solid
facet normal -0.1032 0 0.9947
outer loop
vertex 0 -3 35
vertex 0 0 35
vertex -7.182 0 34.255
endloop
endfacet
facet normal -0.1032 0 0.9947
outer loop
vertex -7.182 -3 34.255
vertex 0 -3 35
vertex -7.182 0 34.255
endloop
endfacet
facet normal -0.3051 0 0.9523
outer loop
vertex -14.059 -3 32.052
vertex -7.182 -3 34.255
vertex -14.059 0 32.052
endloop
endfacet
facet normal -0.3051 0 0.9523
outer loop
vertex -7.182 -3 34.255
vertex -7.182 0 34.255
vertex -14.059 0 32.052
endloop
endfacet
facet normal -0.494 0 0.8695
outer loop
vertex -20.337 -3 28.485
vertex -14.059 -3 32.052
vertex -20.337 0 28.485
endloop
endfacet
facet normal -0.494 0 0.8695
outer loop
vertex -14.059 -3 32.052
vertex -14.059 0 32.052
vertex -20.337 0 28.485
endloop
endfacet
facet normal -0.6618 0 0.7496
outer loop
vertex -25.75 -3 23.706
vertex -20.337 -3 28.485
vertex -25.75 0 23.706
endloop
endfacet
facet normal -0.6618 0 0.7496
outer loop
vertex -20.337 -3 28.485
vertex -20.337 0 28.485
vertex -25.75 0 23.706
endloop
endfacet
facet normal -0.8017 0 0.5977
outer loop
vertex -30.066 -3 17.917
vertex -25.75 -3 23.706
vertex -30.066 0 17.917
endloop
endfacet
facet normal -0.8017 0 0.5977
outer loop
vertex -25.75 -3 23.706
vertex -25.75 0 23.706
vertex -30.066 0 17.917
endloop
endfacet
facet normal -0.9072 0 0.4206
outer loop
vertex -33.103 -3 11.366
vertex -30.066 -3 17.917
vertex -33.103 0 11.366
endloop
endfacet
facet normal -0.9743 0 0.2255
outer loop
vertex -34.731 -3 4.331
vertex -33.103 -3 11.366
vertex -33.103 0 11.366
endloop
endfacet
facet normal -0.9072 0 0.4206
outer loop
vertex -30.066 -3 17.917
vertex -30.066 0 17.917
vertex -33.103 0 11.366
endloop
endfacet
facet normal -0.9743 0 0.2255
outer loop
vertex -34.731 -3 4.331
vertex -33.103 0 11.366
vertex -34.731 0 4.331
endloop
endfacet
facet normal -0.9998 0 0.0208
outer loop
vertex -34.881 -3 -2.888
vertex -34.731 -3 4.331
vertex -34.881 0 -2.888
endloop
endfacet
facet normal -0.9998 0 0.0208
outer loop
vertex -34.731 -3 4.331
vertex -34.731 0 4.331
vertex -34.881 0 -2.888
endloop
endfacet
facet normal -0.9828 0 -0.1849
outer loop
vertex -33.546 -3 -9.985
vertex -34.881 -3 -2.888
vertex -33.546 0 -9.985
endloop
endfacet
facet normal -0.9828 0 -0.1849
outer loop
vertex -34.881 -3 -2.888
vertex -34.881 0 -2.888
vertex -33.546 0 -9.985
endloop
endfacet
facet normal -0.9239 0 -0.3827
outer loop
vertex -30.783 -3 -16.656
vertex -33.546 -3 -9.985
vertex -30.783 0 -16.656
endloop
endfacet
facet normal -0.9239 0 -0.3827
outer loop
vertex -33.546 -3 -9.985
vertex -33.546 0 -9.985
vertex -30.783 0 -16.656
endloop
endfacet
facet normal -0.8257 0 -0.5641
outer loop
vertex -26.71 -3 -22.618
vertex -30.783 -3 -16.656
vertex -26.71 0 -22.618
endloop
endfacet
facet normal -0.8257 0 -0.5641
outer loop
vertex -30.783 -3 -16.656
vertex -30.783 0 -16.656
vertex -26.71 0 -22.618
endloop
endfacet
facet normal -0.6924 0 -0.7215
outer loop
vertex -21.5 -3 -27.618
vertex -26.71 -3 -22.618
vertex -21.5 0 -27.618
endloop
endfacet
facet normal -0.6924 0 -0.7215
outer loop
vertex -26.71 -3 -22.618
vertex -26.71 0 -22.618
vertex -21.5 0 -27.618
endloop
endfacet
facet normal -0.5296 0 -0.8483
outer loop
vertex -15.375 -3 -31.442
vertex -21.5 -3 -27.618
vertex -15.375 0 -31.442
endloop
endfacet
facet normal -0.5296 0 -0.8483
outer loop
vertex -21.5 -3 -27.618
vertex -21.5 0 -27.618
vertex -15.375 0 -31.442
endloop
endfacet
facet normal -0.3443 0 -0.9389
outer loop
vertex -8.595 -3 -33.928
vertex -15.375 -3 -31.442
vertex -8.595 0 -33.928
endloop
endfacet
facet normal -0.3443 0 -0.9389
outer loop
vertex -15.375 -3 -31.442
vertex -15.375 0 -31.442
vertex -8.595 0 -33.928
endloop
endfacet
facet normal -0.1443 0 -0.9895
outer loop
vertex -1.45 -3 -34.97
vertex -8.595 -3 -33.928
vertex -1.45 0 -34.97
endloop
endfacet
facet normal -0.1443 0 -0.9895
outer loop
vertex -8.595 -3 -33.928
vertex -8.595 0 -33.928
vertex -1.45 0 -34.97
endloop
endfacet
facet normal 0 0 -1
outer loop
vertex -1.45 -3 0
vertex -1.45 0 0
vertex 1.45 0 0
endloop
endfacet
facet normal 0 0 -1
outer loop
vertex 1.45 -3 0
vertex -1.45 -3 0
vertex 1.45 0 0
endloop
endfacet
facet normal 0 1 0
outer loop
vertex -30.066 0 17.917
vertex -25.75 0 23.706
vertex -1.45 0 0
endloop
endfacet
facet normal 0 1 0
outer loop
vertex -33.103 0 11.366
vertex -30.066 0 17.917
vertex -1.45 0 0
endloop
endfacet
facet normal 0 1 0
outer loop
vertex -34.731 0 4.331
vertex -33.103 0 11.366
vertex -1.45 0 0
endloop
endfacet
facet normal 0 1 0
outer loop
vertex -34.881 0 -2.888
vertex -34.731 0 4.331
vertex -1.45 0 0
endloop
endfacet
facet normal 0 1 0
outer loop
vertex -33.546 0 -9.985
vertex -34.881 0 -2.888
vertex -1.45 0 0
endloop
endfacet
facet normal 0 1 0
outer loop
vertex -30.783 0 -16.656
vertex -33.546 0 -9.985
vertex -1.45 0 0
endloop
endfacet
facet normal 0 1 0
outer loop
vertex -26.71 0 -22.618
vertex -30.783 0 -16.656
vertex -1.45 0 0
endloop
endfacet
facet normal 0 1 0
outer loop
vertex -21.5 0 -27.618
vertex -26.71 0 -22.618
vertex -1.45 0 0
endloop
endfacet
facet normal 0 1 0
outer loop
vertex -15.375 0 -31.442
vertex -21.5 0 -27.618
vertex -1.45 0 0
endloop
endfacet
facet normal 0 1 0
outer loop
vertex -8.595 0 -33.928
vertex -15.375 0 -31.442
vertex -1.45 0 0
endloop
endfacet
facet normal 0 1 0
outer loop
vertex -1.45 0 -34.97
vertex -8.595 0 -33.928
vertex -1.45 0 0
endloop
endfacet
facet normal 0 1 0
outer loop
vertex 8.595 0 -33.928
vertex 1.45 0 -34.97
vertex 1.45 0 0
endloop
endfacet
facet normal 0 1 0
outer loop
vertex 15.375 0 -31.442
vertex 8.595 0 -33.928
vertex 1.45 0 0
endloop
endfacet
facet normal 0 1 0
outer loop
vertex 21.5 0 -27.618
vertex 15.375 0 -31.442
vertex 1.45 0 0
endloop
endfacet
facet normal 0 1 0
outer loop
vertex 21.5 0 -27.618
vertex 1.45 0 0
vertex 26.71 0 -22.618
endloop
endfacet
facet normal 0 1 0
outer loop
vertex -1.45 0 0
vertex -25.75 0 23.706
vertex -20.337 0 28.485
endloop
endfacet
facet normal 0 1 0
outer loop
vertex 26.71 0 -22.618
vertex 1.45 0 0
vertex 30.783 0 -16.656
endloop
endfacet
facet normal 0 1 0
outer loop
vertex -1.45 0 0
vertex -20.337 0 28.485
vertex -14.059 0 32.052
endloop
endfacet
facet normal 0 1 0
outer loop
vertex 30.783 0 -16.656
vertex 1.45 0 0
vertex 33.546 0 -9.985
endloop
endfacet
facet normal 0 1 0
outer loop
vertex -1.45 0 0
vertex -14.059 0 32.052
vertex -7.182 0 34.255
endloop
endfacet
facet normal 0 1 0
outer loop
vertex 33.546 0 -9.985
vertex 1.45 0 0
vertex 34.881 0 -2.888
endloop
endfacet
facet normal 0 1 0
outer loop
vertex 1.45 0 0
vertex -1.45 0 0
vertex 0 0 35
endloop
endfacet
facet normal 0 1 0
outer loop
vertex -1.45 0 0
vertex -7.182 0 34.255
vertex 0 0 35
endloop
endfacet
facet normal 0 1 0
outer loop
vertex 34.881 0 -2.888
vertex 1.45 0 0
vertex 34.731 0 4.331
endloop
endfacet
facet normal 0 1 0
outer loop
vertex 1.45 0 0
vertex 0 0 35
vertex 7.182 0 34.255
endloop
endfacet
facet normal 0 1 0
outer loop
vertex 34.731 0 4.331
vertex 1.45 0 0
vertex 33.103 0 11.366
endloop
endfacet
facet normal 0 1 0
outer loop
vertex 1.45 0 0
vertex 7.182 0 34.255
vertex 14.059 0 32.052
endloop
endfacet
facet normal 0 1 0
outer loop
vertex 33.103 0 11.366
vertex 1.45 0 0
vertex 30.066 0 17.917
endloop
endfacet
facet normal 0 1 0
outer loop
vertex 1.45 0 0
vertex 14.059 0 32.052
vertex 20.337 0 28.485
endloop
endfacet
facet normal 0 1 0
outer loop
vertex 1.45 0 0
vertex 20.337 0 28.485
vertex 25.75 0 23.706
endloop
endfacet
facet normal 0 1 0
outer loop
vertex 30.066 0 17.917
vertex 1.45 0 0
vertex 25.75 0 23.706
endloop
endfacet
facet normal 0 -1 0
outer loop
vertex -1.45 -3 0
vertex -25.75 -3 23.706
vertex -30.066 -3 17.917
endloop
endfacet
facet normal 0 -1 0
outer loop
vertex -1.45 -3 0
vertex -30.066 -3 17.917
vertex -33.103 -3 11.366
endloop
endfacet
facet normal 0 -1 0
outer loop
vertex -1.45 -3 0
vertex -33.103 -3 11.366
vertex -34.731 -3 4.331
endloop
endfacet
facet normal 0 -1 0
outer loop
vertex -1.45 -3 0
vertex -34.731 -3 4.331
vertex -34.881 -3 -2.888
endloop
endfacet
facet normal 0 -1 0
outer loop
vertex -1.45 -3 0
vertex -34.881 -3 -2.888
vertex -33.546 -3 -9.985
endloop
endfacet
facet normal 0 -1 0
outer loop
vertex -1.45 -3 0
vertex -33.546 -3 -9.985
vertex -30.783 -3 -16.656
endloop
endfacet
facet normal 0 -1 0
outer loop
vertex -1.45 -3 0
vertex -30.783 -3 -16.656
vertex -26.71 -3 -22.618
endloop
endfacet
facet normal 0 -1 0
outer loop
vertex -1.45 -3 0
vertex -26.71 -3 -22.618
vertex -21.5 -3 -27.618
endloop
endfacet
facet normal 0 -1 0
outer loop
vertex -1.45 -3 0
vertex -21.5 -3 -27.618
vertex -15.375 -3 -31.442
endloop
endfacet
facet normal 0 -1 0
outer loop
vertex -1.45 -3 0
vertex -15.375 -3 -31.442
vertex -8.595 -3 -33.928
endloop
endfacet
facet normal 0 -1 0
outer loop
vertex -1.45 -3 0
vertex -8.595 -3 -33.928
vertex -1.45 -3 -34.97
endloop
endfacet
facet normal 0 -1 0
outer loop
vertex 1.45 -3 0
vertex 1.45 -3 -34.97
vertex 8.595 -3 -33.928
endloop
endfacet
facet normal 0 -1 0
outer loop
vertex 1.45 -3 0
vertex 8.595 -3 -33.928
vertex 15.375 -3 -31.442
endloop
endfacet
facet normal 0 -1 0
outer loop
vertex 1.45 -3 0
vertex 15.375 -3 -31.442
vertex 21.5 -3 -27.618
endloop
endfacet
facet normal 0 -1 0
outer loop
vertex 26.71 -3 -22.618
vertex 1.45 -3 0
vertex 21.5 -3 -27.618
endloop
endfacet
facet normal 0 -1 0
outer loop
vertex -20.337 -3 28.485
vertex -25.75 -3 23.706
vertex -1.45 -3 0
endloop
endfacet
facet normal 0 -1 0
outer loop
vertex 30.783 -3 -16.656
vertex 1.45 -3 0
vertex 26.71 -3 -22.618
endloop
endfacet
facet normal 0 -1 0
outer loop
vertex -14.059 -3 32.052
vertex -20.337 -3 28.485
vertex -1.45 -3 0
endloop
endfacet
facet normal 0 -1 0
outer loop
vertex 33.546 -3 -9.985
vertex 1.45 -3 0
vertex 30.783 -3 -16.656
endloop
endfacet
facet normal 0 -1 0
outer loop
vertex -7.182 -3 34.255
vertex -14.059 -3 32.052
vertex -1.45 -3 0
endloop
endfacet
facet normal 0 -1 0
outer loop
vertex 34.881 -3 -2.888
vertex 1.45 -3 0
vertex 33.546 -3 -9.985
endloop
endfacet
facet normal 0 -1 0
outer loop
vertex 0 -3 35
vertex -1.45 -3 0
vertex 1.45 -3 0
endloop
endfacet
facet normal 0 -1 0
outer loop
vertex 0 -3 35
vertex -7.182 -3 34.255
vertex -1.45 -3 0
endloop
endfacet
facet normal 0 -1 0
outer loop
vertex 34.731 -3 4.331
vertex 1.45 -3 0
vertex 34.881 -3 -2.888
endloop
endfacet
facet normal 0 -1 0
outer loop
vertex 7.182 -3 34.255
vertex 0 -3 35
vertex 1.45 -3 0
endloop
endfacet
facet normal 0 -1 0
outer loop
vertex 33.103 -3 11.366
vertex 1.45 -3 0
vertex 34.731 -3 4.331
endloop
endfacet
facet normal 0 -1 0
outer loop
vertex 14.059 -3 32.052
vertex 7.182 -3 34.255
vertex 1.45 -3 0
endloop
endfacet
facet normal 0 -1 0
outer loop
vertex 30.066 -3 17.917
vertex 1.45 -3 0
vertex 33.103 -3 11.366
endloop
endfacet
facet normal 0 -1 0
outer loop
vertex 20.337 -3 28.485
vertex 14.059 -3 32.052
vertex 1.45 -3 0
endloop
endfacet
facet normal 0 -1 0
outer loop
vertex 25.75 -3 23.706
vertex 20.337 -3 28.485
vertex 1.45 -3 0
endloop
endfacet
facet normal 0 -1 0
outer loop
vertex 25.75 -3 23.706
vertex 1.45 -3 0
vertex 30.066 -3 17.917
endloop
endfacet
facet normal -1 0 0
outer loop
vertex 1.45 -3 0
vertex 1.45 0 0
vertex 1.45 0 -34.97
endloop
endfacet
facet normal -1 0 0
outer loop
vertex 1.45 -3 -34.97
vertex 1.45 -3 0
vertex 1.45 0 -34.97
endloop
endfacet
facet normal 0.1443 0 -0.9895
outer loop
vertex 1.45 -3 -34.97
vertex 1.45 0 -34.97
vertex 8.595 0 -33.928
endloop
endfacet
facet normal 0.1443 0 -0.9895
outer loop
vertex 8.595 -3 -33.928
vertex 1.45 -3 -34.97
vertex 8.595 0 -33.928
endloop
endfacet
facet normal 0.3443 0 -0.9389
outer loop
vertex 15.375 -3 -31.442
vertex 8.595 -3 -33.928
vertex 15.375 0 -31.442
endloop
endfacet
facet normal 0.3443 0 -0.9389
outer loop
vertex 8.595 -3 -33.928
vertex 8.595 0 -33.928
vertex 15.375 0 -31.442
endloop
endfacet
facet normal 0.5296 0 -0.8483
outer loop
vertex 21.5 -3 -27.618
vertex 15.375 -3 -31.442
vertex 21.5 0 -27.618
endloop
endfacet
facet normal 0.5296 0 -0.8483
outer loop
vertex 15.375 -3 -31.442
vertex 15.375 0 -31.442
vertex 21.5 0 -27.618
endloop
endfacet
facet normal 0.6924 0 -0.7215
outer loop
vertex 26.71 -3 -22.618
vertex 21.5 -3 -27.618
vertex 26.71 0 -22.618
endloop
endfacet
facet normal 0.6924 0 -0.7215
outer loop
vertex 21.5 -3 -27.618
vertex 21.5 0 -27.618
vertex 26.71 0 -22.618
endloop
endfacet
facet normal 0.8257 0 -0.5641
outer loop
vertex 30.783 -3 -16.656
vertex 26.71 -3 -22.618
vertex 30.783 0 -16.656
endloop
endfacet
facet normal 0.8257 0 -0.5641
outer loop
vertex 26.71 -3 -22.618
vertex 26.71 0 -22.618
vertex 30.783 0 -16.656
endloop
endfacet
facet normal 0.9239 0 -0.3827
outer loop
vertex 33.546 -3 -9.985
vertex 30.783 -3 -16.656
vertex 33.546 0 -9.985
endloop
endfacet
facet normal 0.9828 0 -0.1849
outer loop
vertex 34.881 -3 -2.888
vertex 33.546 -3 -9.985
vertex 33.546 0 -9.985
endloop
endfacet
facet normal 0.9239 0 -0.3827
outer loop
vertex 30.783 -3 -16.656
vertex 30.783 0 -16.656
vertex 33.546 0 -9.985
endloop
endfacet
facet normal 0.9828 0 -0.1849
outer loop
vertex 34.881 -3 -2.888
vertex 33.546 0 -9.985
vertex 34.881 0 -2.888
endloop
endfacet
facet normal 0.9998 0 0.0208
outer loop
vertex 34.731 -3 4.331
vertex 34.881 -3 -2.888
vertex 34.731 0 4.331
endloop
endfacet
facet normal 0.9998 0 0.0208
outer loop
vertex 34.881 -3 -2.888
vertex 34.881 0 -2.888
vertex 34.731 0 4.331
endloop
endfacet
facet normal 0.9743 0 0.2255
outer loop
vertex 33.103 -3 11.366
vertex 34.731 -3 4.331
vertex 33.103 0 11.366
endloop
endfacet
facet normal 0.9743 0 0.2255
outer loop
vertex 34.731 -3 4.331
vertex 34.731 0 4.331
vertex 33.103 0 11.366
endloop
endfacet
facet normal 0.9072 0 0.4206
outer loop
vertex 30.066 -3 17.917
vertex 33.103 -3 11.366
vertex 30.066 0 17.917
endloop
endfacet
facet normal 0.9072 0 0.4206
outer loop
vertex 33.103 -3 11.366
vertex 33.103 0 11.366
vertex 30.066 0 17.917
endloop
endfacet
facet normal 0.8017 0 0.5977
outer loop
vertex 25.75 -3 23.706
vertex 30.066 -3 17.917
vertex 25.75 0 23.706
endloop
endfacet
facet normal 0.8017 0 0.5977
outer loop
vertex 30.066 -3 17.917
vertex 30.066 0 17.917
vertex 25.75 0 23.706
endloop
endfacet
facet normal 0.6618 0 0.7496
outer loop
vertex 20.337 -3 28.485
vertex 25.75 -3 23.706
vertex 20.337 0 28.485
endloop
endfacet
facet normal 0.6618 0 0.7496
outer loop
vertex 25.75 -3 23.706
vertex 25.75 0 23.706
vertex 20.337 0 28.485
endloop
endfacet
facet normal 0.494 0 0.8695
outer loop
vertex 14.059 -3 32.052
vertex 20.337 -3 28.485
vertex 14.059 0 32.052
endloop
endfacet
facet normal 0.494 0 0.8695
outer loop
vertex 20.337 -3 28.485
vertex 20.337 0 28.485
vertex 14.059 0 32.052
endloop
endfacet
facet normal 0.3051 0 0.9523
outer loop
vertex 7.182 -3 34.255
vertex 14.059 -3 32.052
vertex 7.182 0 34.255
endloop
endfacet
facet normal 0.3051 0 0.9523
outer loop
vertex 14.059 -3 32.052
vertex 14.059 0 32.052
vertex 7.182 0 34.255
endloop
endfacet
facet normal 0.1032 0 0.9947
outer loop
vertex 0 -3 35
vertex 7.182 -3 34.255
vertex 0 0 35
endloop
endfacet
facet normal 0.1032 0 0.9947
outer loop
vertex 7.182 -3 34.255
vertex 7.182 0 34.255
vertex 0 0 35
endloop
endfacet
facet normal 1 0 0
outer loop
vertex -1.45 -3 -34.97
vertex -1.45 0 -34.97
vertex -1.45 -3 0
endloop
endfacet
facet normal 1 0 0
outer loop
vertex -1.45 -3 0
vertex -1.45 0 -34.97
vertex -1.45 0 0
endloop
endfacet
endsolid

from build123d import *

# Parameters (mm, degrees)
F1_DEPTH = 3


with BuildPart() as f1:
    # F0 (on Front) → F1 (new body)
    with BuildSketch(Plane.XZ):
        with BuildLine():
            Line((1.45, 0), (1.45, -34.969951))
            ThreePointArc((1.45, -34.969951), (34.992487, 0.725156), (0, 35))
            ThreePointArc((0, 35), (-34.992487, 0.725156), (-1.45, -34.969951))
            Line((-1.45, -34.969951), (-1.45, 0))
            Line((-1.45, 0), (0, 0))
            Line((0, 0), (1.45, 0))
        make_face()
    extrude(amount=F1_DEPTH)


solid = f1.part
